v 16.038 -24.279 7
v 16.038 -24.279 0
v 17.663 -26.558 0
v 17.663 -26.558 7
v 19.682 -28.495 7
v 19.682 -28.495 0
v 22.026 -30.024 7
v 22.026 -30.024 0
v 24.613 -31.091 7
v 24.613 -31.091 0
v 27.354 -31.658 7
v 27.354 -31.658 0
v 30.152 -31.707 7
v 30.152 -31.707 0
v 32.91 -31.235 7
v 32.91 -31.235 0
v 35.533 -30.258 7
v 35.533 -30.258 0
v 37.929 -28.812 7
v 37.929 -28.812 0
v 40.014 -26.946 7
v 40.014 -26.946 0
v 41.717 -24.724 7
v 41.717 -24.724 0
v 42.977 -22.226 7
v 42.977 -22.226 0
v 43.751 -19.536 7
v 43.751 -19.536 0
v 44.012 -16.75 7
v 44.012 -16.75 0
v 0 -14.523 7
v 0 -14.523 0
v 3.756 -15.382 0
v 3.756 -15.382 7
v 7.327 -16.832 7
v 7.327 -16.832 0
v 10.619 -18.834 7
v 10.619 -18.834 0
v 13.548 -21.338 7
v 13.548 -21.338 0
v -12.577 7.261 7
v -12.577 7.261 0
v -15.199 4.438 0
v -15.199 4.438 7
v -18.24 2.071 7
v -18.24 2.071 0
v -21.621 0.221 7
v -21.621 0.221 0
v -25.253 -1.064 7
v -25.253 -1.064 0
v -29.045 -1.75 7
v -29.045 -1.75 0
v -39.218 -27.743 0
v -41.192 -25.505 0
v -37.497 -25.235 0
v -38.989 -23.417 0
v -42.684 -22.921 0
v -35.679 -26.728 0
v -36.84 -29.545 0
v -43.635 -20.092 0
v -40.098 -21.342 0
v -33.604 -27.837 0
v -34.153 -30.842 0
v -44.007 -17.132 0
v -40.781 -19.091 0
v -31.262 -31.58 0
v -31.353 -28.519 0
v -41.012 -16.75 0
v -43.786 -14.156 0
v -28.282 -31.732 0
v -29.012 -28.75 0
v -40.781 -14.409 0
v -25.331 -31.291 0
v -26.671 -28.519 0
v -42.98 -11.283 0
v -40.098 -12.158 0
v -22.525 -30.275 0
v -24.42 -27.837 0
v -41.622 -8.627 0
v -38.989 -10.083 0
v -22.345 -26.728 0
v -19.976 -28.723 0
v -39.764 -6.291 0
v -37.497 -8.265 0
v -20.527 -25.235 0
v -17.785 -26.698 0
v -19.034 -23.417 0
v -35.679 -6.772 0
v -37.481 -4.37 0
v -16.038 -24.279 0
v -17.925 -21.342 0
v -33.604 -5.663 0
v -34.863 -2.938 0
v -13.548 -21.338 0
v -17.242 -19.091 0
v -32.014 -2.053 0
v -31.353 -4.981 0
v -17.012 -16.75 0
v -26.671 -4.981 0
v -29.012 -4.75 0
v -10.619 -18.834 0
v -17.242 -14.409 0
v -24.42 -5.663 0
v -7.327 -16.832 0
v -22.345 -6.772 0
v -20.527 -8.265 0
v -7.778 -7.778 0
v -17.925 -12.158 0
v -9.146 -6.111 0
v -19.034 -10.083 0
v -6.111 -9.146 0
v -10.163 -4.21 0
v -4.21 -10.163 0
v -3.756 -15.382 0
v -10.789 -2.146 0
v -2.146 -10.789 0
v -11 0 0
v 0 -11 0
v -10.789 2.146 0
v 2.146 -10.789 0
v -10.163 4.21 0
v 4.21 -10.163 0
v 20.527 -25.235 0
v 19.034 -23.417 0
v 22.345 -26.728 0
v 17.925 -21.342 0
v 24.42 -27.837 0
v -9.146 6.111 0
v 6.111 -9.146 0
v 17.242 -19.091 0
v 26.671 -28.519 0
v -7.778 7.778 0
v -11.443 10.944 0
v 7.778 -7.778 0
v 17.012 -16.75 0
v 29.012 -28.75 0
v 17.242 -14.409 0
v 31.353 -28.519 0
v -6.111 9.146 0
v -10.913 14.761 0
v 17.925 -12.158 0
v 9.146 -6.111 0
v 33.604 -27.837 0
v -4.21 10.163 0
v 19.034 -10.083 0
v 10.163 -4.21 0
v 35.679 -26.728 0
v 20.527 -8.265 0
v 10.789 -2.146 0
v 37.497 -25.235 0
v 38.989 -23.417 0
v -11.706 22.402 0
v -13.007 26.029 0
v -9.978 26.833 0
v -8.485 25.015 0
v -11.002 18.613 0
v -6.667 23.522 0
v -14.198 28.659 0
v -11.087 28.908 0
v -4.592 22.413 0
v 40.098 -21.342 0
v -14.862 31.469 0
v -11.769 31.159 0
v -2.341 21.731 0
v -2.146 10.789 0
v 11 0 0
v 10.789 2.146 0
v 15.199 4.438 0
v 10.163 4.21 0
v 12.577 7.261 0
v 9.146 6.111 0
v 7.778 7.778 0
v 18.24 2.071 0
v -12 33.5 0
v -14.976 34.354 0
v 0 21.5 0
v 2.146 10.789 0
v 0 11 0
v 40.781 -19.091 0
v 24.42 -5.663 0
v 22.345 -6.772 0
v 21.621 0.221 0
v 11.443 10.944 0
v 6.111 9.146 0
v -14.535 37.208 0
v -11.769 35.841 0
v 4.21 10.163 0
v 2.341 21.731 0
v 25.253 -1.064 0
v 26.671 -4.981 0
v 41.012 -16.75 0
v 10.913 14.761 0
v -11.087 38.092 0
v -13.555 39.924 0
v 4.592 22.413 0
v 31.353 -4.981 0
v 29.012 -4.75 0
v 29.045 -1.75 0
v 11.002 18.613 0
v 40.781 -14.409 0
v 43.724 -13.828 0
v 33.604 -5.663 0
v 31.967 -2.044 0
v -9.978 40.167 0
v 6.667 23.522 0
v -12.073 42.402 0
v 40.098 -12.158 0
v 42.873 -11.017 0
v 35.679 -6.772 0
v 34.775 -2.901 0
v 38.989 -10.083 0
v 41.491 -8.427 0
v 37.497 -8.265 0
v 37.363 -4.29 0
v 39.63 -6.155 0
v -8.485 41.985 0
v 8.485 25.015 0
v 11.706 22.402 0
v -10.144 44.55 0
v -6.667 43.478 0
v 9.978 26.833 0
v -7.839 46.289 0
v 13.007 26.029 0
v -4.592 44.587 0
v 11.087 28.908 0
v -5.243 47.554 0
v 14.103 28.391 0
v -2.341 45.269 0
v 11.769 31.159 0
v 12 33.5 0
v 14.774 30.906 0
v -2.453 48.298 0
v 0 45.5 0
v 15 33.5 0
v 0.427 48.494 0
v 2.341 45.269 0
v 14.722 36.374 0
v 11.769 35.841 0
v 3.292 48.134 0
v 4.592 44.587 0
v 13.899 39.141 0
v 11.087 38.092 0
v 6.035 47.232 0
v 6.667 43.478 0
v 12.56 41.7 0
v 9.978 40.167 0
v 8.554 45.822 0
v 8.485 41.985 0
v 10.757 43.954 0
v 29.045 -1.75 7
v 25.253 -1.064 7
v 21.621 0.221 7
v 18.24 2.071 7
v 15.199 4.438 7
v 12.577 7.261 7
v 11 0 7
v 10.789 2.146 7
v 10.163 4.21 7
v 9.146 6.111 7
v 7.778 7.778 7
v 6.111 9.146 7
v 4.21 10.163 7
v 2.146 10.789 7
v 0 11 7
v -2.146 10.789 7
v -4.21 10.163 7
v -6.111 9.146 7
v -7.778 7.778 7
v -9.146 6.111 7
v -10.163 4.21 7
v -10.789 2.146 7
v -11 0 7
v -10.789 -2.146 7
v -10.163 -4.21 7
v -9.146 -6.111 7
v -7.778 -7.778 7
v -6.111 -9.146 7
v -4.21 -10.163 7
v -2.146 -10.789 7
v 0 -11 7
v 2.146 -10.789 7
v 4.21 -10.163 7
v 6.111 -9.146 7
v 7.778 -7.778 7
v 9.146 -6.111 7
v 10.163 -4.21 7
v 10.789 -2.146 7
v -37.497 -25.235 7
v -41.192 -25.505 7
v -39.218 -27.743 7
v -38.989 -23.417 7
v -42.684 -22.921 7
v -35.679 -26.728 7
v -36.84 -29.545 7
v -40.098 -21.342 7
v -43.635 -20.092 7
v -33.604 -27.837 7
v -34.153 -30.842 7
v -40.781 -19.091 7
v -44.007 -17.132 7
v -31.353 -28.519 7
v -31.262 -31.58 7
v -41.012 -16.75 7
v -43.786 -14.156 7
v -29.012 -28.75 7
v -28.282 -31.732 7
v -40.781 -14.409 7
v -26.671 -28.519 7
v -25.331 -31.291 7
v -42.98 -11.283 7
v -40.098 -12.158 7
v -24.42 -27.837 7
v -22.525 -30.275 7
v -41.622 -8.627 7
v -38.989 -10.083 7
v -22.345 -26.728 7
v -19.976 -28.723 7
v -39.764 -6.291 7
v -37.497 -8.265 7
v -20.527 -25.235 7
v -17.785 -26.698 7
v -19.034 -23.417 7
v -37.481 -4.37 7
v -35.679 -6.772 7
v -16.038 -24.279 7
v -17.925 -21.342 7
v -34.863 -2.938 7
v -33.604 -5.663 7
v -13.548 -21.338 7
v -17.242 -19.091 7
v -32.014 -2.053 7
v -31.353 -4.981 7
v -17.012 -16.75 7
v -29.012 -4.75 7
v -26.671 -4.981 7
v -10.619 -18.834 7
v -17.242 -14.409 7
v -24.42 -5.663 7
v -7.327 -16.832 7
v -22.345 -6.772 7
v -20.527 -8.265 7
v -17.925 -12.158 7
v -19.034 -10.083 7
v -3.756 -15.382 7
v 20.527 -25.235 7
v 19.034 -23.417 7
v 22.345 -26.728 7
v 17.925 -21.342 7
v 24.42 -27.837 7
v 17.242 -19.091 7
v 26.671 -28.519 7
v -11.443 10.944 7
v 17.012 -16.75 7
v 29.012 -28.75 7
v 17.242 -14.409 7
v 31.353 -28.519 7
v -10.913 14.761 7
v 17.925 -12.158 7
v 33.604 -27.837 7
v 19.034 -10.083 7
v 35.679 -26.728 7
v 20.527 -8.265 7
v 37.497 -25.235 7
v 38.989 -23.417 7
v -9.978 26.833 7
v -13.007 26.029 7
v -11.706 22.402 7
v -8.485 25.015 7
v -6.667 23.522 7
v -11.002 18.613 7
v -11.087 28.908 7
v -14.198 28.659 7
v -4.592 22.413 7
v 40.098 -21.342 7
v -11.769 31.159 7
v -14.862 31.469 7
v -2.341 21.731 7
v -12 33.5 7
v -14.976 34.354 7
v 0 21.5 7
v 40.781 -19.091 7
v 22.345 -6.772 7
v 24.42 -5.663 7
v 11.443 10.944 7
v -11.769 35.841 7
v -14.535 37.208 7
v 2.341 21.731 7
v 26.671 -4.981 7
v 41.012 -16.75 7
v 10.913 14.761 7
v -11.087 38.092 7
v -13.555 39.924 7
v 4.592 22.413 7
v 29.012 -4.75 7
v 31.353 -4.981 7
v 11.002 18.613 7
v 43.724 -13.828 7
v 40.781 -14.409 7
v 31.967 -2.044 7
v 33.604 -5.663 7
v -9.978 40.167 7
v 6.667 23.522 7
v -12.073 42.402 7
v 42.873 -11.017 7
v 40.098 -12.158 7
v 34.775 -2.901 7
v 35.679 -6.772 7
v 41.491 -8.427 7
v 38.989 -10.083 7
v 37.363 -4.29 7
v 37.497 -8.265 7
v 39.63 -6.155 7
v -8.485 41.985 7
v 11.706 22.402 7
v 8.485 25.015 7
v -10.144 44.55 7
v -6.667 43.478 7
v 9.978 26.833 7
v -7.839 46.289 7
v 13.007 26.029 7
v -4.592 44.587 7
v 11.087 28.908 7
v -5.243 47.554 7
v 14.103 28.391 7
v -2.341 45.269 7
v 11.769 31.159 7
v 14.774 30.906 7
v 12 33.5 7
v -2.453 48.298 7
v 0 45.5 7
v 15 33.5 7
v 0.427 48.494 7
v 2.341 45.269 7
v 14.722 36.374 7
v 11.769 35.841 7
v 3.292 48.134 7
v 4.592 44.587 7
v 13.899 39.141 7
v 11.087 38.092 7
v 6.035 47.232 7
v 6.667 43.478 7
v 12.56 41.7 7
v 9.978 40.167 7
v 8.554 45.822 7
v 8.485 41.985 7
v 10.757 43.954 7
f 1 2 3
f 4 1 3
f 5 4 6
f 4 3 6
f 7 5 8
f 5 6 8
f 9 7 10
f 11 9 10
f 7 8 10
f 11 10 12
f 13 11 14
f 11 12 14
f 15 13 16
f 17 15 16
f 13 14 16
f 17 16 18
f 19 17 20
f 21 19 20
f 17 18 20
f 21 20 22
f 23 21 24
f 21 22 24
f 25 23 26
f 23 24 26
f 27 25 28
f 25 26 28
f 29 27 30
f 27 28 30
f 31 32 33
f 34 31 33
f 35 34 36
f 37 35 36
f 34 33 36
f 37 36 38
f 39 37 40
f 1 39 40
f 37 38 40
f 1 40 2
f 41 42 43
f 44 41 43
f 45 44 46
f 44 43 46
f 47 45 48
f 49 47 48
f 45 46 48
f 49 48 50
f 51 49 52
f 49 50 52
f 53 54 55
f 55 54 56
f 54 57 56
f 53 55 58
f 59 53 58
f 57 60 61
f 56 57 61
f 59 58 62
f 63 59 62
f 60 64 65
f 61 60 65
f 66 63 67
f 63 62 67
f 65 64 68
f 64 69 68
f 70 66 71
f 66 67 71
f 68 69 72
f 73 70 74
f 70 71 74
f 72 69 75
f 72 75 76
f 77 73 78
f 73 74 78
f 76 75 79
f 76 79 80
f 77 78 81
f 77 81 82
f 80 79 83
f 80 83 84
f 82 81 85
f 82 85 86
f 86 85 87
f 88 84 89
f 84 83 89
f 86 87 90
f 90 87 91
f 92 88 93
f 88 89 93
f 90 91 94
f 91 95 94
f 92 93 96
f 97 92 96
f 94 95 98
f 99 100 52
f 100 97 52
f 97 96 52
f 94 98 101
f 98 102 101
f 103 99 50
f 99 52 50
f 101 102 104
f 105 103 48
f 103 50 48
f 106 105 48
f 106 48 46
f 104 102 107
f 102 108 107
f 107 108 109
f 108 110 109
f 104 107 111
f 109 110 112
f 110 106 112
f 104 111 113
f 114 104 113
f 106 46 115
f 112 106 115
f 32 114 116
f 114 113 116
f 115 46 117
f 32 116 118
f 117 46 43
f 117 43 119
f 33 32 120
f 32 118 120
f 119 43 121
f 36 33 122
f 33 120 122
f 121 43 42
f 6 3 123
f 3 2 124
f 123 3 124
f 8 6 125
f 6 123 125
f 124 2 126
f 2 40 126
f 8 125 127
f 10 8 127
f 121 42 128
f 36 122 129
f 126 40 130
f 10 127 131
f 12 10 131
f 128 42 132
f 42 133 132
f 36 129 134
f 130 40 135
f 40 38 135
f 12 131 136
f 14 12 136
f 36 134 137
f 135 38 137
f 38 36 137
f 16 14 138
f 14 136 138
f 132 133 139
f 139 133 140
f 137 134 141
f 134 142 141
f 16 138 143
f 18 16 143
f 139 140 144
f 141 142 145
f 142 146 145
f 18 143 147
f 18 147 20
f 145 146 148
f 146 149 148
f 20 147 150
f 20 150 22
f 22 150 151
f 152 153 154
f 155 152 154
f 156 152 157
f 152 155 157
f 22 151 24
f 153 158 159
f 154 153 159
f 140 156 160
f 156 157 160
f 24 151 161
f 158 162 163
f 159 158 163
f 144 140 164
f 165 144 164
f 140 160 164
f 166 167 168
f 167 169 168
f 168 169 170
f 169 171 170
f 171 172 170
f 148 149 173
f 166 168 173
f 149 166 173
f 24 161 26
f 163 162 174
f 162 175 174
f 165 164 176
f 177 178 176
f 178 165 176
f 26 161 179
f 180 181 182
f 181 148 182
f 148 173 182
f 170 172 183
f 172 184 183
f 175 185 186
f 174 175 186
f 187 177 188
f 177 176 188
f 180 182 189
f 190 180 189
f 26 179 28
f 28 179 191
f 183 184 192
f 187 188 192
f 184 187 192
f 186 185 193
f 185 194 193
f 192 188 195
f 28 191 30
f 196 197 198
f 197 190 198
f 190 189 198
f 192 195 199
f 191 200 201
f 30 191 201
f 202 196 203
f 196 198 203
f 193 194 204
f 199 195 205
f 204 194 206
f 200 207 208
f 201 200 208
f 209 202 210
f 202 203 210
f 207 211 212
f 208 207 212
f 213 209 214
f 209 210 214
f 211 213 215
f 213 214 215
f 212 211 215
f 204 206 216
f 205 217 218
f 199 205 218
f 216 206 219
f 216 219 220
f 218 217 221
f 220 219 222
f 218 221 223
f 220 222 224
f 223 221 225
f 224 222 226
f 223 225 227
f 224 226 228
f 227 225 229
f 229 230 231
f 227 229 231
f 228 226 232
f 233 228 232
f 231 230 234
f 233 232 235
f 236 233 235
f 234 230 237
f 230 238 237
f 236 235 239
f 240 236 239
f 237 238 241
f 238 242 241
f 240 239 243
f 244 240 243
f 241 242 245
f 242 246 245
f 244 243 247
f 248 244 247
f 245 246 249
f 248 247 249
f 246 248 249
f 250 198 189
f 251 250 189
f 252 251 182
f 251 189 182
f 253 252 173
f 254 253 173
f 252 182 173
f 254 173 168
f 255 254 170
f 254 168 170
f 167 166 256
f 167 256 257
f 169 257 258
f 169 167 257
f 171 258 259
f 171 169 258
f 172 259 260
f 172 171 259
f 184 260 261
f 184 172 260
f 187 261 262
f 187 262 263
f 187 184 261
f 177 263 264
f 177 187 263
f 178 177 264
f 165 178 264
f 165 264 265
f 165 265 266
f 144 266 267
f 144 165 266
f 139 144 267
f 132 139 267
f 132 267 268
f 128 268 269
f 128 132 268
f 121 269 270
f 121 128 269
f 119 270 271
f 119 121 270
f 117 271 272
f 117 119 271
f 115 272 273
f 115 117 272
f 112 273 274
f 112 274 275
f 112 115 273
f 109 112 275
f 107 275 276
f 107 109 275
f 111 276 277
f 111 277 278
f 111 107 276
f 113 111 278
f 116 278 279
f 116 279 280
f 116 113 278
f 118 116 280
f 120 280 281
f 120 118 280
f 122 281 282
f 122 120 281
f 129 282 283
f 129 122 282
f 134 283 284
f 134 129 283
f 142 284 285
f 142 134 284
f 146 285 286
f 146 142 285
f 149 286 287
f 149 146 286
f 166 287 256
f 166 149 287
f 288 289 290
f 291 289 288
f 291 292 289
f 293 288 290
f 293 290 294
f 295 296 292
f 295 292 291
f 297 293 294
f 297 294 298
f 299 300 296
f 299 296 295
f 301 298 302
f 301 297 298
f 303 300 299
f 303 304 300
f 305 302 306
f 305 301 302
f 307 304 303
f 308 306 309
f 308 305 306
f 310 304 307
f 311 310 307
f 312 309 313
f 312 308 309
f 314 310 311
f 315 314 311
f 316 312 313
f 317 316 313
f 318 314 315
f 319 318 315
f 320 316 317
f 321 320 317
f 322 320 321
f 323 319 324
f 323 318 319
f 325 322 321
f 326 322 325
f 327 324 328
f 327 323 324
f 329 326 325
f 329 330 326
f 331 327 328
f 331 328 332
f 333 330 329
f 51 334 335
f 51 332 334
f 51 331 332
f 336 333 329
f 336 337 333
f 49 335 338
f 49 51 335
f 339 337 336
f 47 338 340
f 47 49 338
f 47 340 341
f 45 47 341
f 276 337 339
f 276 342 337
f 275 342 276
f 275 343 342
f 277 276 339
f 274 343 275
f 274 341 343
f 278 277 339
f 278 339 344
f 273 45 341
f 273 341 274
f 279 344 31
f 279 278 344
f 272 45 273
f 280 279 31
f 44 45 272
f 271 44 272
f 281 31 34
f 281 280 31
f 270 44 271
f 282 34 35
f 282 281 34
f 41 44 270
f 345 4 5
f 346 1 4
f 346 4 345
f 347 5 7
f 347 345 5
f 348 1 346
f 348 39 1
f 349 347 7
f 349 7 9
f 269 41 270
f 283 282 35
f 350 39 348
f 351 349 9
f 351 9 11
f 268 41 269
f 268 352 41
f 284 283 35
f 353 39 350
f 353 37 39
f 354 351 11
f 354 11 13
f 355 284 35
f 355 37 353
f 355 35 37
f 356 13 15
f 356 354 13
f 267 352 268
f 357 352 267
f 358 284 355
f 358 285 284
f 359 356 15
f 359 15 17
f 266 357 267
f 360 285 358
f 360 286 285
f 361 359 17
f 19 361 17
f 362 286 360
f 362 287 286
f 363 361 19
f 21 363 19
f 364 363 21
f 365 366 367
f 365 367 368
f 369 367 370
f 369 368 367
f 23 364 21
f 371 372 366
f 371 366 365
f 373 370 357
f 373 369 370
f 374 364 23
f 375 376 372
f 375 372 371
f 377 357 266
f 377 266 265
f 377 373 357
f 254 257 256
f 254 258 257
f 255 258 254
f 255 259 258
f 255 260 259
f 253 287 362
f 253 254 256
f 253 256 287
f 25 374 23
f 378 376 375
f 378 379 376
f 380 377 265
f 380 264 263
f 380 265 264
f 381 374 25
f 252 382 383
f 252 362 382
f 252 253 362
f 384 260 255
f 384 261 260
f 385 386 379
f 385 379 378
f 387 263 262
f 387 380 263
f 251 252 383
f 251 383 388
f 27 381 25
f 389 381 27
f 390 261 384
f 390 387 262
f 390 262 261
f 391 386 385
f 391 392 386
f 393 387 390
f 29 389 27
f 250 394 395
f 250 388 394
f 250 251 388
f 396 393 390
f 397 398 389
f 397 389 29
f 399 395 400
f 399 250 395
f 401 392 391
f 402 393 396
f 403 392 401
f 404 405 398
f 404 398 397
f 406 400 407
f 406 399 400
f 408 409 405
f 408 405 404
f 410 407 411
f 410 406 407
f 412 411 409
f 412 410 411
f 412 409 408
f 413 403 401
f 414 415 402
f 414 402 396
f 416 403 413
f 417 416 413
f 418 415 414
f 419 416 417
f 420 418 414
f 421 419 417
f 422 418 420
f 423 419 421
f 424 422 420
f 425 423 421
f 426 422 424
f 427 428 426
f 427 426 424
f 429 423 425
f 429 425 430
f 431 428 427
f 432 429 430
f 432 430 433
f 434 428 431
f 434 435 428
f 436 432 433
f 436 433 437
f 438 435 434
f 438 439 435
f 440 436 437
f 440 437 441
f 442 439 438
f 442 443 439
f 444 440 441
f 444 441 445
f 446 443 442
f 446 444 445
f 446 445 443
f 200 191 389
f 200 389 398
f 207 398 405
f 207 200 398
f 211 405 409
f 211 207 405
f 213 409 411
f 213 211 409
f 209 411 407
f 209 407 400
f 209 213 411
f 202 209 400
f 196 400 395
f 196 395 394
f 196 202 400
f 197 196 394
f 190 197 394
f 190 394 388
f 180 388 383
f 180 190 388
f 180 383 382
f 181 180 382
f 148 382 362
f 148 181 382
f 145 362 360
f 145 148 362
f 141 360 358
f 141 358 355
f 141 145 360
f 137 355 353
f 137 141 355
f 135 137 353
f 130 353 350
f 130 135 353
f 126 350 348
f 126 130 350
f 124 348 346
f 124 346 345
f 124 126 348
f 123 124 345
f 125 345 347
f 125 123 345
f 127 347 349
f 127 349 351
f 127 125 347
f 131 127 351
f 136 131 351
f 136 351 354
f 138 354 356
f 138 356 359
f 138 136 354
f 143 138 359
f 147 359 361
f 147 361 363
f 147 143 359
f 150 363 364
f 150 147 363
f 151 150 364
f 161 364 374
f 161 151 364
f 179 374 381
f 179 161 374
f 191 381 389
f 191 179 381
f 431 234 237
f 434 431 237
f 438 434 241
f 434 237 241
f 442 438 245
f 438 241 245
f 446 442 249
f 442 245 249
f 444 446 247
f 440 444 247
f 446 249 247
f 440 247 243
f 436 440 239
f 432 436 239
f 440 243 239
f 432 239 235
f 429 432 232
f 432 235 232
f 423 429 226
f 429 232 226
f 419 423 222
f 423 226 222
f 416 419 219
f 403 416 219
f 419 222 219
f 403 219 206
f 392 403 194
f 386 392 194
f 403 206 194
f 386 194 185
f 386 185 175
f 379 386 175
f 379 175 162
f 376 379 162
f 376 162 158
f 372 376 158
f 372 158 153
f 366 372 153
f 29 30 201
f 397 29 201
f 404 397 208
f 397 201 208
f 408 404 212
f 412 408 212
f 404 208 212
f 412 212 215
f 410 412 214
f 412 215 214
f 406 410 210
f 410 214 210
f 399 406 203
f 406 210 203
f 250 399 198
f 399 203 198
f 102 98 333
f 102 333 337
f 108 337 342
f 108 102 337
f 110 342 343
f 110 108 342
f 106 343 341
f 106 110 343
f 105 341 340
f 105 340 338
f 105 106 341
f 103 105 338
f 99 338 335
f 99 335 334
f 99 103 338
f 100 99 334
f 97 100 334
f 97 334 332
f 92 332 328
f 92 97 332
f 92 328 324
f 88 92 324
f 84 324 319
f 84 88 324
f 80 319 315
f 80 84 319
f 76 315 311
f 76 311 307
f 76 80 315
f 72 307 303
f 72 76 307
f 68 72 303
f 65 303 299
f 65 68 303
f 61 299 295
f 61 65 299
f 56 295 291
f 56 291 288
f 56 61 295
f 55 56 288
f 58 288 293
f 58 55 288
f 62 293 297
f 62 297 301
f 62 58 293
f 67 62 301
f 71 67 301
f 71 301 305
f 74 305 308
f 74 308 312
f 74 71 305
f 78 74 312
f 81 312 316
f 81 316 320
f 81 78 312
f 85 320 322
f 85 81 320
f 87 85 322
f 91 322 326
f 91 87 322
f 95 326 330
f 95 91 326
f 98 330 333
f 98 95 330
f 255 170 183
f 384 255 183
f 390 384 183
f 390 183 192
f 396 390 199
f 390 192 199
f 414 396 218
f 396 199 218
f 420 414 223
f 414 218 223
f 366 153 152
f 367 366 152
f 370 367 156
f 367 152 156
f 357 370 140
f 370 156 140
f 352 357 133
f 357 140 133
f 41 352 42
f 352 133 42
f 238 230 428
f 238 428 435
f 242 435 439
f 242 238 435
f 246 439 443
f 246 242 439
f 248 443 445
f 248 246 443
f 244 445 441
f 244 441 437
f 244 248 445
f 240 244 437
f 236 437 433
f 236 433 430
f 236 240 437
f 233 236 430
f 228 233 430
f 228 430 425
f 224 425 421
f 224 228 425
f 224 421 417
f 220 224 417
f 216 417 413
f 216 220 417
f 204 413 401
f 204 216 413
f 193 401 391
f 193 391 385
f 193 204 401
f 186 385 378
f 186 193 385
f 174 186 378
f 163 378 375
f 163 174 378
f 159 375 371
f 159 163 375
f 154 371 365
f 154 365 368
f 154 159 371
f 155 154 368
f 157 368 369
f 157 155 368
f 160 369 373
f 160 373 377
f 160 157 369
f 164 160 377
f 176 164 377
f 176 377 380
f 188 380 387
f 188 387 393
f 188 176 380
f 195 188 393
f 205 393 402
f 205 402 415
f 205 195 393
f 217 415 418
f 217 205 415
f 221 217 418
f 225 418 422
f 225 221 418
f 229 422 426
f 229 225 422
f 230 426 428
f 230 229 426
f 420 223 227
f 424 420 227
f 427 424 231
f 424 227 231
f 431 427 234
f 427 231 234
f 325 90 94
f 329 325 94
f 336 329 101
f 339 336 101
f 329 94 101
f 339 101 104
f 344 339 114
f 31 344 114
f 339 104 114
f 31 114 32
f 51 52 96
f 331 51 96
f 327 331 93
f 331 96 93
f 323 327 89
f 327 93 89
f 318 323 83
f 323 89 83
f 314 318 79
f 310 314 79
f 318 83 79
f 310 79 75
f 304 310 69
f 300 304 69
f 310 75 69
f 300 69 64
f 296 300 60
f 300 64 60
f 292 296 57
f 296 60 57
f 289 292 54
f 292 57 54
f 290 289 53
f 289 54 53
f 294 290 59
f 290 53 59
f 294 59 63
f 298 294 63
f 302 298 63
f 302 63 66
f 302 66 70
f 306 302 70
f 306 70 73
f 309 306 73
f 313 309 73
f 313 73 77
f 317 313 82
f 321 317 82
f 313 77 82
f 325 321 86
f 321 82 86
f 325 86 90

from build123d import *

# Parameters (mm, degrees)
F0_R     = 12
F0_R_2   = 14.5
F0_R_3   = 11
F1_DEPTH = 7


with BuildPart() as f1:
    # F0 (on Top) → F1 (new body)
    with BuildSketch(Plane.XY):
        with BuildLine():
            ThreePointArc((13.007052, 26.028949), (14.493201, 29.63385), (15, 33.5))
            ThreePointArc((15, 33.5), (-3.86615, 47.993201), (-13.007052, 26.028949))
            ThreePointArc((-13.007052, 26.028949), (0, 18.5), (13.007052, 26.028949))
        make_face()
        with Locations((0, 33.5)):
            Circle(F0_R, mode=Mode.SUBTRACT)
        with BuildLine():
            ThreePointArc((13.007052, 26.028949), (0, 18.5), (-13.007052, 26.028949))
            ThreePointArc((-13.007052, 26.028949), (-10.880101, 16.688967), (-12.577073, 7.261376))
            ThreePointArc((-12.577073, 7.261376), (-19.89312, 1.07796), (-29.045257, -1.750037))
            ThreePointArc((-29.045257, -1.750037), (-18.417067, -6.131594), (-14.011851, -16.75))
            ThreePointArc((-14.011851, -16.75), (-14.527296, -20.648417), (-16.038205, -24.278912))
            ThreePointArc((-16.038205, -24.278912), (-9.013019, -17.766927), (0, -14.522753))
            ThreePointArc((0, -14.522753), (9.013019, -17.766927), (16.038205, -24.278912))
            ThreePointArc((16.038205, -24.278912), (16.02147, -9.25), (29.045257, -1.750037))
            ThreePointArc((29.045257, -1.750037), (19.89312, 1.07796), (12.577073, 7.261376))
            ThreePointArc((12.577073, 7.261376), (10.880101, 16.688967), (13.007052, 26.028949))
        make_face()
        Circle(F0_R_2, mode=Mode.SUBTRACT)
        with BuildLine():
            ThreePointArc((-14.011851, -16.75), (-18.417067, -6.131594), (-29.045257, -1.750037))
            ThreePointArc((-29.045257, -1.750037), (-42.002232, -24.25), (-16.038205, -24.278912))
            ThreePointArc((-16.038205, -24.278912), (-14.527296, -20.648417), (-14.011851, -16.75))
        make_face()
        with Locations((-29.011851, -16.75)):
            Circle(F0_R, mode=Mode.SUBTRACT)
        with BuildLine():
            ThreePointArc((44.011851, -16.75), (39.630257, -6.155216), (29.045257, -1.750037))
            ThreePointArc((29.045257, -1.750037), (16.02147, -9.25), (16.038205, -24.278912))
            ThreePointArc((16.038205, -24.278912), (32.910268, -31.234555), (44.011851, -16.75))
        make_face()
        with Locations((29.011851, -16.75)):
            Circle(F0_R, mode=Mode.SUBTRACT)
        Circle(F0_R_2)
        Circle(F0_R_3, mode=Mode.SUBTRACT)
    extrude(amount=F1_DEPTH)


solid = f1.part
